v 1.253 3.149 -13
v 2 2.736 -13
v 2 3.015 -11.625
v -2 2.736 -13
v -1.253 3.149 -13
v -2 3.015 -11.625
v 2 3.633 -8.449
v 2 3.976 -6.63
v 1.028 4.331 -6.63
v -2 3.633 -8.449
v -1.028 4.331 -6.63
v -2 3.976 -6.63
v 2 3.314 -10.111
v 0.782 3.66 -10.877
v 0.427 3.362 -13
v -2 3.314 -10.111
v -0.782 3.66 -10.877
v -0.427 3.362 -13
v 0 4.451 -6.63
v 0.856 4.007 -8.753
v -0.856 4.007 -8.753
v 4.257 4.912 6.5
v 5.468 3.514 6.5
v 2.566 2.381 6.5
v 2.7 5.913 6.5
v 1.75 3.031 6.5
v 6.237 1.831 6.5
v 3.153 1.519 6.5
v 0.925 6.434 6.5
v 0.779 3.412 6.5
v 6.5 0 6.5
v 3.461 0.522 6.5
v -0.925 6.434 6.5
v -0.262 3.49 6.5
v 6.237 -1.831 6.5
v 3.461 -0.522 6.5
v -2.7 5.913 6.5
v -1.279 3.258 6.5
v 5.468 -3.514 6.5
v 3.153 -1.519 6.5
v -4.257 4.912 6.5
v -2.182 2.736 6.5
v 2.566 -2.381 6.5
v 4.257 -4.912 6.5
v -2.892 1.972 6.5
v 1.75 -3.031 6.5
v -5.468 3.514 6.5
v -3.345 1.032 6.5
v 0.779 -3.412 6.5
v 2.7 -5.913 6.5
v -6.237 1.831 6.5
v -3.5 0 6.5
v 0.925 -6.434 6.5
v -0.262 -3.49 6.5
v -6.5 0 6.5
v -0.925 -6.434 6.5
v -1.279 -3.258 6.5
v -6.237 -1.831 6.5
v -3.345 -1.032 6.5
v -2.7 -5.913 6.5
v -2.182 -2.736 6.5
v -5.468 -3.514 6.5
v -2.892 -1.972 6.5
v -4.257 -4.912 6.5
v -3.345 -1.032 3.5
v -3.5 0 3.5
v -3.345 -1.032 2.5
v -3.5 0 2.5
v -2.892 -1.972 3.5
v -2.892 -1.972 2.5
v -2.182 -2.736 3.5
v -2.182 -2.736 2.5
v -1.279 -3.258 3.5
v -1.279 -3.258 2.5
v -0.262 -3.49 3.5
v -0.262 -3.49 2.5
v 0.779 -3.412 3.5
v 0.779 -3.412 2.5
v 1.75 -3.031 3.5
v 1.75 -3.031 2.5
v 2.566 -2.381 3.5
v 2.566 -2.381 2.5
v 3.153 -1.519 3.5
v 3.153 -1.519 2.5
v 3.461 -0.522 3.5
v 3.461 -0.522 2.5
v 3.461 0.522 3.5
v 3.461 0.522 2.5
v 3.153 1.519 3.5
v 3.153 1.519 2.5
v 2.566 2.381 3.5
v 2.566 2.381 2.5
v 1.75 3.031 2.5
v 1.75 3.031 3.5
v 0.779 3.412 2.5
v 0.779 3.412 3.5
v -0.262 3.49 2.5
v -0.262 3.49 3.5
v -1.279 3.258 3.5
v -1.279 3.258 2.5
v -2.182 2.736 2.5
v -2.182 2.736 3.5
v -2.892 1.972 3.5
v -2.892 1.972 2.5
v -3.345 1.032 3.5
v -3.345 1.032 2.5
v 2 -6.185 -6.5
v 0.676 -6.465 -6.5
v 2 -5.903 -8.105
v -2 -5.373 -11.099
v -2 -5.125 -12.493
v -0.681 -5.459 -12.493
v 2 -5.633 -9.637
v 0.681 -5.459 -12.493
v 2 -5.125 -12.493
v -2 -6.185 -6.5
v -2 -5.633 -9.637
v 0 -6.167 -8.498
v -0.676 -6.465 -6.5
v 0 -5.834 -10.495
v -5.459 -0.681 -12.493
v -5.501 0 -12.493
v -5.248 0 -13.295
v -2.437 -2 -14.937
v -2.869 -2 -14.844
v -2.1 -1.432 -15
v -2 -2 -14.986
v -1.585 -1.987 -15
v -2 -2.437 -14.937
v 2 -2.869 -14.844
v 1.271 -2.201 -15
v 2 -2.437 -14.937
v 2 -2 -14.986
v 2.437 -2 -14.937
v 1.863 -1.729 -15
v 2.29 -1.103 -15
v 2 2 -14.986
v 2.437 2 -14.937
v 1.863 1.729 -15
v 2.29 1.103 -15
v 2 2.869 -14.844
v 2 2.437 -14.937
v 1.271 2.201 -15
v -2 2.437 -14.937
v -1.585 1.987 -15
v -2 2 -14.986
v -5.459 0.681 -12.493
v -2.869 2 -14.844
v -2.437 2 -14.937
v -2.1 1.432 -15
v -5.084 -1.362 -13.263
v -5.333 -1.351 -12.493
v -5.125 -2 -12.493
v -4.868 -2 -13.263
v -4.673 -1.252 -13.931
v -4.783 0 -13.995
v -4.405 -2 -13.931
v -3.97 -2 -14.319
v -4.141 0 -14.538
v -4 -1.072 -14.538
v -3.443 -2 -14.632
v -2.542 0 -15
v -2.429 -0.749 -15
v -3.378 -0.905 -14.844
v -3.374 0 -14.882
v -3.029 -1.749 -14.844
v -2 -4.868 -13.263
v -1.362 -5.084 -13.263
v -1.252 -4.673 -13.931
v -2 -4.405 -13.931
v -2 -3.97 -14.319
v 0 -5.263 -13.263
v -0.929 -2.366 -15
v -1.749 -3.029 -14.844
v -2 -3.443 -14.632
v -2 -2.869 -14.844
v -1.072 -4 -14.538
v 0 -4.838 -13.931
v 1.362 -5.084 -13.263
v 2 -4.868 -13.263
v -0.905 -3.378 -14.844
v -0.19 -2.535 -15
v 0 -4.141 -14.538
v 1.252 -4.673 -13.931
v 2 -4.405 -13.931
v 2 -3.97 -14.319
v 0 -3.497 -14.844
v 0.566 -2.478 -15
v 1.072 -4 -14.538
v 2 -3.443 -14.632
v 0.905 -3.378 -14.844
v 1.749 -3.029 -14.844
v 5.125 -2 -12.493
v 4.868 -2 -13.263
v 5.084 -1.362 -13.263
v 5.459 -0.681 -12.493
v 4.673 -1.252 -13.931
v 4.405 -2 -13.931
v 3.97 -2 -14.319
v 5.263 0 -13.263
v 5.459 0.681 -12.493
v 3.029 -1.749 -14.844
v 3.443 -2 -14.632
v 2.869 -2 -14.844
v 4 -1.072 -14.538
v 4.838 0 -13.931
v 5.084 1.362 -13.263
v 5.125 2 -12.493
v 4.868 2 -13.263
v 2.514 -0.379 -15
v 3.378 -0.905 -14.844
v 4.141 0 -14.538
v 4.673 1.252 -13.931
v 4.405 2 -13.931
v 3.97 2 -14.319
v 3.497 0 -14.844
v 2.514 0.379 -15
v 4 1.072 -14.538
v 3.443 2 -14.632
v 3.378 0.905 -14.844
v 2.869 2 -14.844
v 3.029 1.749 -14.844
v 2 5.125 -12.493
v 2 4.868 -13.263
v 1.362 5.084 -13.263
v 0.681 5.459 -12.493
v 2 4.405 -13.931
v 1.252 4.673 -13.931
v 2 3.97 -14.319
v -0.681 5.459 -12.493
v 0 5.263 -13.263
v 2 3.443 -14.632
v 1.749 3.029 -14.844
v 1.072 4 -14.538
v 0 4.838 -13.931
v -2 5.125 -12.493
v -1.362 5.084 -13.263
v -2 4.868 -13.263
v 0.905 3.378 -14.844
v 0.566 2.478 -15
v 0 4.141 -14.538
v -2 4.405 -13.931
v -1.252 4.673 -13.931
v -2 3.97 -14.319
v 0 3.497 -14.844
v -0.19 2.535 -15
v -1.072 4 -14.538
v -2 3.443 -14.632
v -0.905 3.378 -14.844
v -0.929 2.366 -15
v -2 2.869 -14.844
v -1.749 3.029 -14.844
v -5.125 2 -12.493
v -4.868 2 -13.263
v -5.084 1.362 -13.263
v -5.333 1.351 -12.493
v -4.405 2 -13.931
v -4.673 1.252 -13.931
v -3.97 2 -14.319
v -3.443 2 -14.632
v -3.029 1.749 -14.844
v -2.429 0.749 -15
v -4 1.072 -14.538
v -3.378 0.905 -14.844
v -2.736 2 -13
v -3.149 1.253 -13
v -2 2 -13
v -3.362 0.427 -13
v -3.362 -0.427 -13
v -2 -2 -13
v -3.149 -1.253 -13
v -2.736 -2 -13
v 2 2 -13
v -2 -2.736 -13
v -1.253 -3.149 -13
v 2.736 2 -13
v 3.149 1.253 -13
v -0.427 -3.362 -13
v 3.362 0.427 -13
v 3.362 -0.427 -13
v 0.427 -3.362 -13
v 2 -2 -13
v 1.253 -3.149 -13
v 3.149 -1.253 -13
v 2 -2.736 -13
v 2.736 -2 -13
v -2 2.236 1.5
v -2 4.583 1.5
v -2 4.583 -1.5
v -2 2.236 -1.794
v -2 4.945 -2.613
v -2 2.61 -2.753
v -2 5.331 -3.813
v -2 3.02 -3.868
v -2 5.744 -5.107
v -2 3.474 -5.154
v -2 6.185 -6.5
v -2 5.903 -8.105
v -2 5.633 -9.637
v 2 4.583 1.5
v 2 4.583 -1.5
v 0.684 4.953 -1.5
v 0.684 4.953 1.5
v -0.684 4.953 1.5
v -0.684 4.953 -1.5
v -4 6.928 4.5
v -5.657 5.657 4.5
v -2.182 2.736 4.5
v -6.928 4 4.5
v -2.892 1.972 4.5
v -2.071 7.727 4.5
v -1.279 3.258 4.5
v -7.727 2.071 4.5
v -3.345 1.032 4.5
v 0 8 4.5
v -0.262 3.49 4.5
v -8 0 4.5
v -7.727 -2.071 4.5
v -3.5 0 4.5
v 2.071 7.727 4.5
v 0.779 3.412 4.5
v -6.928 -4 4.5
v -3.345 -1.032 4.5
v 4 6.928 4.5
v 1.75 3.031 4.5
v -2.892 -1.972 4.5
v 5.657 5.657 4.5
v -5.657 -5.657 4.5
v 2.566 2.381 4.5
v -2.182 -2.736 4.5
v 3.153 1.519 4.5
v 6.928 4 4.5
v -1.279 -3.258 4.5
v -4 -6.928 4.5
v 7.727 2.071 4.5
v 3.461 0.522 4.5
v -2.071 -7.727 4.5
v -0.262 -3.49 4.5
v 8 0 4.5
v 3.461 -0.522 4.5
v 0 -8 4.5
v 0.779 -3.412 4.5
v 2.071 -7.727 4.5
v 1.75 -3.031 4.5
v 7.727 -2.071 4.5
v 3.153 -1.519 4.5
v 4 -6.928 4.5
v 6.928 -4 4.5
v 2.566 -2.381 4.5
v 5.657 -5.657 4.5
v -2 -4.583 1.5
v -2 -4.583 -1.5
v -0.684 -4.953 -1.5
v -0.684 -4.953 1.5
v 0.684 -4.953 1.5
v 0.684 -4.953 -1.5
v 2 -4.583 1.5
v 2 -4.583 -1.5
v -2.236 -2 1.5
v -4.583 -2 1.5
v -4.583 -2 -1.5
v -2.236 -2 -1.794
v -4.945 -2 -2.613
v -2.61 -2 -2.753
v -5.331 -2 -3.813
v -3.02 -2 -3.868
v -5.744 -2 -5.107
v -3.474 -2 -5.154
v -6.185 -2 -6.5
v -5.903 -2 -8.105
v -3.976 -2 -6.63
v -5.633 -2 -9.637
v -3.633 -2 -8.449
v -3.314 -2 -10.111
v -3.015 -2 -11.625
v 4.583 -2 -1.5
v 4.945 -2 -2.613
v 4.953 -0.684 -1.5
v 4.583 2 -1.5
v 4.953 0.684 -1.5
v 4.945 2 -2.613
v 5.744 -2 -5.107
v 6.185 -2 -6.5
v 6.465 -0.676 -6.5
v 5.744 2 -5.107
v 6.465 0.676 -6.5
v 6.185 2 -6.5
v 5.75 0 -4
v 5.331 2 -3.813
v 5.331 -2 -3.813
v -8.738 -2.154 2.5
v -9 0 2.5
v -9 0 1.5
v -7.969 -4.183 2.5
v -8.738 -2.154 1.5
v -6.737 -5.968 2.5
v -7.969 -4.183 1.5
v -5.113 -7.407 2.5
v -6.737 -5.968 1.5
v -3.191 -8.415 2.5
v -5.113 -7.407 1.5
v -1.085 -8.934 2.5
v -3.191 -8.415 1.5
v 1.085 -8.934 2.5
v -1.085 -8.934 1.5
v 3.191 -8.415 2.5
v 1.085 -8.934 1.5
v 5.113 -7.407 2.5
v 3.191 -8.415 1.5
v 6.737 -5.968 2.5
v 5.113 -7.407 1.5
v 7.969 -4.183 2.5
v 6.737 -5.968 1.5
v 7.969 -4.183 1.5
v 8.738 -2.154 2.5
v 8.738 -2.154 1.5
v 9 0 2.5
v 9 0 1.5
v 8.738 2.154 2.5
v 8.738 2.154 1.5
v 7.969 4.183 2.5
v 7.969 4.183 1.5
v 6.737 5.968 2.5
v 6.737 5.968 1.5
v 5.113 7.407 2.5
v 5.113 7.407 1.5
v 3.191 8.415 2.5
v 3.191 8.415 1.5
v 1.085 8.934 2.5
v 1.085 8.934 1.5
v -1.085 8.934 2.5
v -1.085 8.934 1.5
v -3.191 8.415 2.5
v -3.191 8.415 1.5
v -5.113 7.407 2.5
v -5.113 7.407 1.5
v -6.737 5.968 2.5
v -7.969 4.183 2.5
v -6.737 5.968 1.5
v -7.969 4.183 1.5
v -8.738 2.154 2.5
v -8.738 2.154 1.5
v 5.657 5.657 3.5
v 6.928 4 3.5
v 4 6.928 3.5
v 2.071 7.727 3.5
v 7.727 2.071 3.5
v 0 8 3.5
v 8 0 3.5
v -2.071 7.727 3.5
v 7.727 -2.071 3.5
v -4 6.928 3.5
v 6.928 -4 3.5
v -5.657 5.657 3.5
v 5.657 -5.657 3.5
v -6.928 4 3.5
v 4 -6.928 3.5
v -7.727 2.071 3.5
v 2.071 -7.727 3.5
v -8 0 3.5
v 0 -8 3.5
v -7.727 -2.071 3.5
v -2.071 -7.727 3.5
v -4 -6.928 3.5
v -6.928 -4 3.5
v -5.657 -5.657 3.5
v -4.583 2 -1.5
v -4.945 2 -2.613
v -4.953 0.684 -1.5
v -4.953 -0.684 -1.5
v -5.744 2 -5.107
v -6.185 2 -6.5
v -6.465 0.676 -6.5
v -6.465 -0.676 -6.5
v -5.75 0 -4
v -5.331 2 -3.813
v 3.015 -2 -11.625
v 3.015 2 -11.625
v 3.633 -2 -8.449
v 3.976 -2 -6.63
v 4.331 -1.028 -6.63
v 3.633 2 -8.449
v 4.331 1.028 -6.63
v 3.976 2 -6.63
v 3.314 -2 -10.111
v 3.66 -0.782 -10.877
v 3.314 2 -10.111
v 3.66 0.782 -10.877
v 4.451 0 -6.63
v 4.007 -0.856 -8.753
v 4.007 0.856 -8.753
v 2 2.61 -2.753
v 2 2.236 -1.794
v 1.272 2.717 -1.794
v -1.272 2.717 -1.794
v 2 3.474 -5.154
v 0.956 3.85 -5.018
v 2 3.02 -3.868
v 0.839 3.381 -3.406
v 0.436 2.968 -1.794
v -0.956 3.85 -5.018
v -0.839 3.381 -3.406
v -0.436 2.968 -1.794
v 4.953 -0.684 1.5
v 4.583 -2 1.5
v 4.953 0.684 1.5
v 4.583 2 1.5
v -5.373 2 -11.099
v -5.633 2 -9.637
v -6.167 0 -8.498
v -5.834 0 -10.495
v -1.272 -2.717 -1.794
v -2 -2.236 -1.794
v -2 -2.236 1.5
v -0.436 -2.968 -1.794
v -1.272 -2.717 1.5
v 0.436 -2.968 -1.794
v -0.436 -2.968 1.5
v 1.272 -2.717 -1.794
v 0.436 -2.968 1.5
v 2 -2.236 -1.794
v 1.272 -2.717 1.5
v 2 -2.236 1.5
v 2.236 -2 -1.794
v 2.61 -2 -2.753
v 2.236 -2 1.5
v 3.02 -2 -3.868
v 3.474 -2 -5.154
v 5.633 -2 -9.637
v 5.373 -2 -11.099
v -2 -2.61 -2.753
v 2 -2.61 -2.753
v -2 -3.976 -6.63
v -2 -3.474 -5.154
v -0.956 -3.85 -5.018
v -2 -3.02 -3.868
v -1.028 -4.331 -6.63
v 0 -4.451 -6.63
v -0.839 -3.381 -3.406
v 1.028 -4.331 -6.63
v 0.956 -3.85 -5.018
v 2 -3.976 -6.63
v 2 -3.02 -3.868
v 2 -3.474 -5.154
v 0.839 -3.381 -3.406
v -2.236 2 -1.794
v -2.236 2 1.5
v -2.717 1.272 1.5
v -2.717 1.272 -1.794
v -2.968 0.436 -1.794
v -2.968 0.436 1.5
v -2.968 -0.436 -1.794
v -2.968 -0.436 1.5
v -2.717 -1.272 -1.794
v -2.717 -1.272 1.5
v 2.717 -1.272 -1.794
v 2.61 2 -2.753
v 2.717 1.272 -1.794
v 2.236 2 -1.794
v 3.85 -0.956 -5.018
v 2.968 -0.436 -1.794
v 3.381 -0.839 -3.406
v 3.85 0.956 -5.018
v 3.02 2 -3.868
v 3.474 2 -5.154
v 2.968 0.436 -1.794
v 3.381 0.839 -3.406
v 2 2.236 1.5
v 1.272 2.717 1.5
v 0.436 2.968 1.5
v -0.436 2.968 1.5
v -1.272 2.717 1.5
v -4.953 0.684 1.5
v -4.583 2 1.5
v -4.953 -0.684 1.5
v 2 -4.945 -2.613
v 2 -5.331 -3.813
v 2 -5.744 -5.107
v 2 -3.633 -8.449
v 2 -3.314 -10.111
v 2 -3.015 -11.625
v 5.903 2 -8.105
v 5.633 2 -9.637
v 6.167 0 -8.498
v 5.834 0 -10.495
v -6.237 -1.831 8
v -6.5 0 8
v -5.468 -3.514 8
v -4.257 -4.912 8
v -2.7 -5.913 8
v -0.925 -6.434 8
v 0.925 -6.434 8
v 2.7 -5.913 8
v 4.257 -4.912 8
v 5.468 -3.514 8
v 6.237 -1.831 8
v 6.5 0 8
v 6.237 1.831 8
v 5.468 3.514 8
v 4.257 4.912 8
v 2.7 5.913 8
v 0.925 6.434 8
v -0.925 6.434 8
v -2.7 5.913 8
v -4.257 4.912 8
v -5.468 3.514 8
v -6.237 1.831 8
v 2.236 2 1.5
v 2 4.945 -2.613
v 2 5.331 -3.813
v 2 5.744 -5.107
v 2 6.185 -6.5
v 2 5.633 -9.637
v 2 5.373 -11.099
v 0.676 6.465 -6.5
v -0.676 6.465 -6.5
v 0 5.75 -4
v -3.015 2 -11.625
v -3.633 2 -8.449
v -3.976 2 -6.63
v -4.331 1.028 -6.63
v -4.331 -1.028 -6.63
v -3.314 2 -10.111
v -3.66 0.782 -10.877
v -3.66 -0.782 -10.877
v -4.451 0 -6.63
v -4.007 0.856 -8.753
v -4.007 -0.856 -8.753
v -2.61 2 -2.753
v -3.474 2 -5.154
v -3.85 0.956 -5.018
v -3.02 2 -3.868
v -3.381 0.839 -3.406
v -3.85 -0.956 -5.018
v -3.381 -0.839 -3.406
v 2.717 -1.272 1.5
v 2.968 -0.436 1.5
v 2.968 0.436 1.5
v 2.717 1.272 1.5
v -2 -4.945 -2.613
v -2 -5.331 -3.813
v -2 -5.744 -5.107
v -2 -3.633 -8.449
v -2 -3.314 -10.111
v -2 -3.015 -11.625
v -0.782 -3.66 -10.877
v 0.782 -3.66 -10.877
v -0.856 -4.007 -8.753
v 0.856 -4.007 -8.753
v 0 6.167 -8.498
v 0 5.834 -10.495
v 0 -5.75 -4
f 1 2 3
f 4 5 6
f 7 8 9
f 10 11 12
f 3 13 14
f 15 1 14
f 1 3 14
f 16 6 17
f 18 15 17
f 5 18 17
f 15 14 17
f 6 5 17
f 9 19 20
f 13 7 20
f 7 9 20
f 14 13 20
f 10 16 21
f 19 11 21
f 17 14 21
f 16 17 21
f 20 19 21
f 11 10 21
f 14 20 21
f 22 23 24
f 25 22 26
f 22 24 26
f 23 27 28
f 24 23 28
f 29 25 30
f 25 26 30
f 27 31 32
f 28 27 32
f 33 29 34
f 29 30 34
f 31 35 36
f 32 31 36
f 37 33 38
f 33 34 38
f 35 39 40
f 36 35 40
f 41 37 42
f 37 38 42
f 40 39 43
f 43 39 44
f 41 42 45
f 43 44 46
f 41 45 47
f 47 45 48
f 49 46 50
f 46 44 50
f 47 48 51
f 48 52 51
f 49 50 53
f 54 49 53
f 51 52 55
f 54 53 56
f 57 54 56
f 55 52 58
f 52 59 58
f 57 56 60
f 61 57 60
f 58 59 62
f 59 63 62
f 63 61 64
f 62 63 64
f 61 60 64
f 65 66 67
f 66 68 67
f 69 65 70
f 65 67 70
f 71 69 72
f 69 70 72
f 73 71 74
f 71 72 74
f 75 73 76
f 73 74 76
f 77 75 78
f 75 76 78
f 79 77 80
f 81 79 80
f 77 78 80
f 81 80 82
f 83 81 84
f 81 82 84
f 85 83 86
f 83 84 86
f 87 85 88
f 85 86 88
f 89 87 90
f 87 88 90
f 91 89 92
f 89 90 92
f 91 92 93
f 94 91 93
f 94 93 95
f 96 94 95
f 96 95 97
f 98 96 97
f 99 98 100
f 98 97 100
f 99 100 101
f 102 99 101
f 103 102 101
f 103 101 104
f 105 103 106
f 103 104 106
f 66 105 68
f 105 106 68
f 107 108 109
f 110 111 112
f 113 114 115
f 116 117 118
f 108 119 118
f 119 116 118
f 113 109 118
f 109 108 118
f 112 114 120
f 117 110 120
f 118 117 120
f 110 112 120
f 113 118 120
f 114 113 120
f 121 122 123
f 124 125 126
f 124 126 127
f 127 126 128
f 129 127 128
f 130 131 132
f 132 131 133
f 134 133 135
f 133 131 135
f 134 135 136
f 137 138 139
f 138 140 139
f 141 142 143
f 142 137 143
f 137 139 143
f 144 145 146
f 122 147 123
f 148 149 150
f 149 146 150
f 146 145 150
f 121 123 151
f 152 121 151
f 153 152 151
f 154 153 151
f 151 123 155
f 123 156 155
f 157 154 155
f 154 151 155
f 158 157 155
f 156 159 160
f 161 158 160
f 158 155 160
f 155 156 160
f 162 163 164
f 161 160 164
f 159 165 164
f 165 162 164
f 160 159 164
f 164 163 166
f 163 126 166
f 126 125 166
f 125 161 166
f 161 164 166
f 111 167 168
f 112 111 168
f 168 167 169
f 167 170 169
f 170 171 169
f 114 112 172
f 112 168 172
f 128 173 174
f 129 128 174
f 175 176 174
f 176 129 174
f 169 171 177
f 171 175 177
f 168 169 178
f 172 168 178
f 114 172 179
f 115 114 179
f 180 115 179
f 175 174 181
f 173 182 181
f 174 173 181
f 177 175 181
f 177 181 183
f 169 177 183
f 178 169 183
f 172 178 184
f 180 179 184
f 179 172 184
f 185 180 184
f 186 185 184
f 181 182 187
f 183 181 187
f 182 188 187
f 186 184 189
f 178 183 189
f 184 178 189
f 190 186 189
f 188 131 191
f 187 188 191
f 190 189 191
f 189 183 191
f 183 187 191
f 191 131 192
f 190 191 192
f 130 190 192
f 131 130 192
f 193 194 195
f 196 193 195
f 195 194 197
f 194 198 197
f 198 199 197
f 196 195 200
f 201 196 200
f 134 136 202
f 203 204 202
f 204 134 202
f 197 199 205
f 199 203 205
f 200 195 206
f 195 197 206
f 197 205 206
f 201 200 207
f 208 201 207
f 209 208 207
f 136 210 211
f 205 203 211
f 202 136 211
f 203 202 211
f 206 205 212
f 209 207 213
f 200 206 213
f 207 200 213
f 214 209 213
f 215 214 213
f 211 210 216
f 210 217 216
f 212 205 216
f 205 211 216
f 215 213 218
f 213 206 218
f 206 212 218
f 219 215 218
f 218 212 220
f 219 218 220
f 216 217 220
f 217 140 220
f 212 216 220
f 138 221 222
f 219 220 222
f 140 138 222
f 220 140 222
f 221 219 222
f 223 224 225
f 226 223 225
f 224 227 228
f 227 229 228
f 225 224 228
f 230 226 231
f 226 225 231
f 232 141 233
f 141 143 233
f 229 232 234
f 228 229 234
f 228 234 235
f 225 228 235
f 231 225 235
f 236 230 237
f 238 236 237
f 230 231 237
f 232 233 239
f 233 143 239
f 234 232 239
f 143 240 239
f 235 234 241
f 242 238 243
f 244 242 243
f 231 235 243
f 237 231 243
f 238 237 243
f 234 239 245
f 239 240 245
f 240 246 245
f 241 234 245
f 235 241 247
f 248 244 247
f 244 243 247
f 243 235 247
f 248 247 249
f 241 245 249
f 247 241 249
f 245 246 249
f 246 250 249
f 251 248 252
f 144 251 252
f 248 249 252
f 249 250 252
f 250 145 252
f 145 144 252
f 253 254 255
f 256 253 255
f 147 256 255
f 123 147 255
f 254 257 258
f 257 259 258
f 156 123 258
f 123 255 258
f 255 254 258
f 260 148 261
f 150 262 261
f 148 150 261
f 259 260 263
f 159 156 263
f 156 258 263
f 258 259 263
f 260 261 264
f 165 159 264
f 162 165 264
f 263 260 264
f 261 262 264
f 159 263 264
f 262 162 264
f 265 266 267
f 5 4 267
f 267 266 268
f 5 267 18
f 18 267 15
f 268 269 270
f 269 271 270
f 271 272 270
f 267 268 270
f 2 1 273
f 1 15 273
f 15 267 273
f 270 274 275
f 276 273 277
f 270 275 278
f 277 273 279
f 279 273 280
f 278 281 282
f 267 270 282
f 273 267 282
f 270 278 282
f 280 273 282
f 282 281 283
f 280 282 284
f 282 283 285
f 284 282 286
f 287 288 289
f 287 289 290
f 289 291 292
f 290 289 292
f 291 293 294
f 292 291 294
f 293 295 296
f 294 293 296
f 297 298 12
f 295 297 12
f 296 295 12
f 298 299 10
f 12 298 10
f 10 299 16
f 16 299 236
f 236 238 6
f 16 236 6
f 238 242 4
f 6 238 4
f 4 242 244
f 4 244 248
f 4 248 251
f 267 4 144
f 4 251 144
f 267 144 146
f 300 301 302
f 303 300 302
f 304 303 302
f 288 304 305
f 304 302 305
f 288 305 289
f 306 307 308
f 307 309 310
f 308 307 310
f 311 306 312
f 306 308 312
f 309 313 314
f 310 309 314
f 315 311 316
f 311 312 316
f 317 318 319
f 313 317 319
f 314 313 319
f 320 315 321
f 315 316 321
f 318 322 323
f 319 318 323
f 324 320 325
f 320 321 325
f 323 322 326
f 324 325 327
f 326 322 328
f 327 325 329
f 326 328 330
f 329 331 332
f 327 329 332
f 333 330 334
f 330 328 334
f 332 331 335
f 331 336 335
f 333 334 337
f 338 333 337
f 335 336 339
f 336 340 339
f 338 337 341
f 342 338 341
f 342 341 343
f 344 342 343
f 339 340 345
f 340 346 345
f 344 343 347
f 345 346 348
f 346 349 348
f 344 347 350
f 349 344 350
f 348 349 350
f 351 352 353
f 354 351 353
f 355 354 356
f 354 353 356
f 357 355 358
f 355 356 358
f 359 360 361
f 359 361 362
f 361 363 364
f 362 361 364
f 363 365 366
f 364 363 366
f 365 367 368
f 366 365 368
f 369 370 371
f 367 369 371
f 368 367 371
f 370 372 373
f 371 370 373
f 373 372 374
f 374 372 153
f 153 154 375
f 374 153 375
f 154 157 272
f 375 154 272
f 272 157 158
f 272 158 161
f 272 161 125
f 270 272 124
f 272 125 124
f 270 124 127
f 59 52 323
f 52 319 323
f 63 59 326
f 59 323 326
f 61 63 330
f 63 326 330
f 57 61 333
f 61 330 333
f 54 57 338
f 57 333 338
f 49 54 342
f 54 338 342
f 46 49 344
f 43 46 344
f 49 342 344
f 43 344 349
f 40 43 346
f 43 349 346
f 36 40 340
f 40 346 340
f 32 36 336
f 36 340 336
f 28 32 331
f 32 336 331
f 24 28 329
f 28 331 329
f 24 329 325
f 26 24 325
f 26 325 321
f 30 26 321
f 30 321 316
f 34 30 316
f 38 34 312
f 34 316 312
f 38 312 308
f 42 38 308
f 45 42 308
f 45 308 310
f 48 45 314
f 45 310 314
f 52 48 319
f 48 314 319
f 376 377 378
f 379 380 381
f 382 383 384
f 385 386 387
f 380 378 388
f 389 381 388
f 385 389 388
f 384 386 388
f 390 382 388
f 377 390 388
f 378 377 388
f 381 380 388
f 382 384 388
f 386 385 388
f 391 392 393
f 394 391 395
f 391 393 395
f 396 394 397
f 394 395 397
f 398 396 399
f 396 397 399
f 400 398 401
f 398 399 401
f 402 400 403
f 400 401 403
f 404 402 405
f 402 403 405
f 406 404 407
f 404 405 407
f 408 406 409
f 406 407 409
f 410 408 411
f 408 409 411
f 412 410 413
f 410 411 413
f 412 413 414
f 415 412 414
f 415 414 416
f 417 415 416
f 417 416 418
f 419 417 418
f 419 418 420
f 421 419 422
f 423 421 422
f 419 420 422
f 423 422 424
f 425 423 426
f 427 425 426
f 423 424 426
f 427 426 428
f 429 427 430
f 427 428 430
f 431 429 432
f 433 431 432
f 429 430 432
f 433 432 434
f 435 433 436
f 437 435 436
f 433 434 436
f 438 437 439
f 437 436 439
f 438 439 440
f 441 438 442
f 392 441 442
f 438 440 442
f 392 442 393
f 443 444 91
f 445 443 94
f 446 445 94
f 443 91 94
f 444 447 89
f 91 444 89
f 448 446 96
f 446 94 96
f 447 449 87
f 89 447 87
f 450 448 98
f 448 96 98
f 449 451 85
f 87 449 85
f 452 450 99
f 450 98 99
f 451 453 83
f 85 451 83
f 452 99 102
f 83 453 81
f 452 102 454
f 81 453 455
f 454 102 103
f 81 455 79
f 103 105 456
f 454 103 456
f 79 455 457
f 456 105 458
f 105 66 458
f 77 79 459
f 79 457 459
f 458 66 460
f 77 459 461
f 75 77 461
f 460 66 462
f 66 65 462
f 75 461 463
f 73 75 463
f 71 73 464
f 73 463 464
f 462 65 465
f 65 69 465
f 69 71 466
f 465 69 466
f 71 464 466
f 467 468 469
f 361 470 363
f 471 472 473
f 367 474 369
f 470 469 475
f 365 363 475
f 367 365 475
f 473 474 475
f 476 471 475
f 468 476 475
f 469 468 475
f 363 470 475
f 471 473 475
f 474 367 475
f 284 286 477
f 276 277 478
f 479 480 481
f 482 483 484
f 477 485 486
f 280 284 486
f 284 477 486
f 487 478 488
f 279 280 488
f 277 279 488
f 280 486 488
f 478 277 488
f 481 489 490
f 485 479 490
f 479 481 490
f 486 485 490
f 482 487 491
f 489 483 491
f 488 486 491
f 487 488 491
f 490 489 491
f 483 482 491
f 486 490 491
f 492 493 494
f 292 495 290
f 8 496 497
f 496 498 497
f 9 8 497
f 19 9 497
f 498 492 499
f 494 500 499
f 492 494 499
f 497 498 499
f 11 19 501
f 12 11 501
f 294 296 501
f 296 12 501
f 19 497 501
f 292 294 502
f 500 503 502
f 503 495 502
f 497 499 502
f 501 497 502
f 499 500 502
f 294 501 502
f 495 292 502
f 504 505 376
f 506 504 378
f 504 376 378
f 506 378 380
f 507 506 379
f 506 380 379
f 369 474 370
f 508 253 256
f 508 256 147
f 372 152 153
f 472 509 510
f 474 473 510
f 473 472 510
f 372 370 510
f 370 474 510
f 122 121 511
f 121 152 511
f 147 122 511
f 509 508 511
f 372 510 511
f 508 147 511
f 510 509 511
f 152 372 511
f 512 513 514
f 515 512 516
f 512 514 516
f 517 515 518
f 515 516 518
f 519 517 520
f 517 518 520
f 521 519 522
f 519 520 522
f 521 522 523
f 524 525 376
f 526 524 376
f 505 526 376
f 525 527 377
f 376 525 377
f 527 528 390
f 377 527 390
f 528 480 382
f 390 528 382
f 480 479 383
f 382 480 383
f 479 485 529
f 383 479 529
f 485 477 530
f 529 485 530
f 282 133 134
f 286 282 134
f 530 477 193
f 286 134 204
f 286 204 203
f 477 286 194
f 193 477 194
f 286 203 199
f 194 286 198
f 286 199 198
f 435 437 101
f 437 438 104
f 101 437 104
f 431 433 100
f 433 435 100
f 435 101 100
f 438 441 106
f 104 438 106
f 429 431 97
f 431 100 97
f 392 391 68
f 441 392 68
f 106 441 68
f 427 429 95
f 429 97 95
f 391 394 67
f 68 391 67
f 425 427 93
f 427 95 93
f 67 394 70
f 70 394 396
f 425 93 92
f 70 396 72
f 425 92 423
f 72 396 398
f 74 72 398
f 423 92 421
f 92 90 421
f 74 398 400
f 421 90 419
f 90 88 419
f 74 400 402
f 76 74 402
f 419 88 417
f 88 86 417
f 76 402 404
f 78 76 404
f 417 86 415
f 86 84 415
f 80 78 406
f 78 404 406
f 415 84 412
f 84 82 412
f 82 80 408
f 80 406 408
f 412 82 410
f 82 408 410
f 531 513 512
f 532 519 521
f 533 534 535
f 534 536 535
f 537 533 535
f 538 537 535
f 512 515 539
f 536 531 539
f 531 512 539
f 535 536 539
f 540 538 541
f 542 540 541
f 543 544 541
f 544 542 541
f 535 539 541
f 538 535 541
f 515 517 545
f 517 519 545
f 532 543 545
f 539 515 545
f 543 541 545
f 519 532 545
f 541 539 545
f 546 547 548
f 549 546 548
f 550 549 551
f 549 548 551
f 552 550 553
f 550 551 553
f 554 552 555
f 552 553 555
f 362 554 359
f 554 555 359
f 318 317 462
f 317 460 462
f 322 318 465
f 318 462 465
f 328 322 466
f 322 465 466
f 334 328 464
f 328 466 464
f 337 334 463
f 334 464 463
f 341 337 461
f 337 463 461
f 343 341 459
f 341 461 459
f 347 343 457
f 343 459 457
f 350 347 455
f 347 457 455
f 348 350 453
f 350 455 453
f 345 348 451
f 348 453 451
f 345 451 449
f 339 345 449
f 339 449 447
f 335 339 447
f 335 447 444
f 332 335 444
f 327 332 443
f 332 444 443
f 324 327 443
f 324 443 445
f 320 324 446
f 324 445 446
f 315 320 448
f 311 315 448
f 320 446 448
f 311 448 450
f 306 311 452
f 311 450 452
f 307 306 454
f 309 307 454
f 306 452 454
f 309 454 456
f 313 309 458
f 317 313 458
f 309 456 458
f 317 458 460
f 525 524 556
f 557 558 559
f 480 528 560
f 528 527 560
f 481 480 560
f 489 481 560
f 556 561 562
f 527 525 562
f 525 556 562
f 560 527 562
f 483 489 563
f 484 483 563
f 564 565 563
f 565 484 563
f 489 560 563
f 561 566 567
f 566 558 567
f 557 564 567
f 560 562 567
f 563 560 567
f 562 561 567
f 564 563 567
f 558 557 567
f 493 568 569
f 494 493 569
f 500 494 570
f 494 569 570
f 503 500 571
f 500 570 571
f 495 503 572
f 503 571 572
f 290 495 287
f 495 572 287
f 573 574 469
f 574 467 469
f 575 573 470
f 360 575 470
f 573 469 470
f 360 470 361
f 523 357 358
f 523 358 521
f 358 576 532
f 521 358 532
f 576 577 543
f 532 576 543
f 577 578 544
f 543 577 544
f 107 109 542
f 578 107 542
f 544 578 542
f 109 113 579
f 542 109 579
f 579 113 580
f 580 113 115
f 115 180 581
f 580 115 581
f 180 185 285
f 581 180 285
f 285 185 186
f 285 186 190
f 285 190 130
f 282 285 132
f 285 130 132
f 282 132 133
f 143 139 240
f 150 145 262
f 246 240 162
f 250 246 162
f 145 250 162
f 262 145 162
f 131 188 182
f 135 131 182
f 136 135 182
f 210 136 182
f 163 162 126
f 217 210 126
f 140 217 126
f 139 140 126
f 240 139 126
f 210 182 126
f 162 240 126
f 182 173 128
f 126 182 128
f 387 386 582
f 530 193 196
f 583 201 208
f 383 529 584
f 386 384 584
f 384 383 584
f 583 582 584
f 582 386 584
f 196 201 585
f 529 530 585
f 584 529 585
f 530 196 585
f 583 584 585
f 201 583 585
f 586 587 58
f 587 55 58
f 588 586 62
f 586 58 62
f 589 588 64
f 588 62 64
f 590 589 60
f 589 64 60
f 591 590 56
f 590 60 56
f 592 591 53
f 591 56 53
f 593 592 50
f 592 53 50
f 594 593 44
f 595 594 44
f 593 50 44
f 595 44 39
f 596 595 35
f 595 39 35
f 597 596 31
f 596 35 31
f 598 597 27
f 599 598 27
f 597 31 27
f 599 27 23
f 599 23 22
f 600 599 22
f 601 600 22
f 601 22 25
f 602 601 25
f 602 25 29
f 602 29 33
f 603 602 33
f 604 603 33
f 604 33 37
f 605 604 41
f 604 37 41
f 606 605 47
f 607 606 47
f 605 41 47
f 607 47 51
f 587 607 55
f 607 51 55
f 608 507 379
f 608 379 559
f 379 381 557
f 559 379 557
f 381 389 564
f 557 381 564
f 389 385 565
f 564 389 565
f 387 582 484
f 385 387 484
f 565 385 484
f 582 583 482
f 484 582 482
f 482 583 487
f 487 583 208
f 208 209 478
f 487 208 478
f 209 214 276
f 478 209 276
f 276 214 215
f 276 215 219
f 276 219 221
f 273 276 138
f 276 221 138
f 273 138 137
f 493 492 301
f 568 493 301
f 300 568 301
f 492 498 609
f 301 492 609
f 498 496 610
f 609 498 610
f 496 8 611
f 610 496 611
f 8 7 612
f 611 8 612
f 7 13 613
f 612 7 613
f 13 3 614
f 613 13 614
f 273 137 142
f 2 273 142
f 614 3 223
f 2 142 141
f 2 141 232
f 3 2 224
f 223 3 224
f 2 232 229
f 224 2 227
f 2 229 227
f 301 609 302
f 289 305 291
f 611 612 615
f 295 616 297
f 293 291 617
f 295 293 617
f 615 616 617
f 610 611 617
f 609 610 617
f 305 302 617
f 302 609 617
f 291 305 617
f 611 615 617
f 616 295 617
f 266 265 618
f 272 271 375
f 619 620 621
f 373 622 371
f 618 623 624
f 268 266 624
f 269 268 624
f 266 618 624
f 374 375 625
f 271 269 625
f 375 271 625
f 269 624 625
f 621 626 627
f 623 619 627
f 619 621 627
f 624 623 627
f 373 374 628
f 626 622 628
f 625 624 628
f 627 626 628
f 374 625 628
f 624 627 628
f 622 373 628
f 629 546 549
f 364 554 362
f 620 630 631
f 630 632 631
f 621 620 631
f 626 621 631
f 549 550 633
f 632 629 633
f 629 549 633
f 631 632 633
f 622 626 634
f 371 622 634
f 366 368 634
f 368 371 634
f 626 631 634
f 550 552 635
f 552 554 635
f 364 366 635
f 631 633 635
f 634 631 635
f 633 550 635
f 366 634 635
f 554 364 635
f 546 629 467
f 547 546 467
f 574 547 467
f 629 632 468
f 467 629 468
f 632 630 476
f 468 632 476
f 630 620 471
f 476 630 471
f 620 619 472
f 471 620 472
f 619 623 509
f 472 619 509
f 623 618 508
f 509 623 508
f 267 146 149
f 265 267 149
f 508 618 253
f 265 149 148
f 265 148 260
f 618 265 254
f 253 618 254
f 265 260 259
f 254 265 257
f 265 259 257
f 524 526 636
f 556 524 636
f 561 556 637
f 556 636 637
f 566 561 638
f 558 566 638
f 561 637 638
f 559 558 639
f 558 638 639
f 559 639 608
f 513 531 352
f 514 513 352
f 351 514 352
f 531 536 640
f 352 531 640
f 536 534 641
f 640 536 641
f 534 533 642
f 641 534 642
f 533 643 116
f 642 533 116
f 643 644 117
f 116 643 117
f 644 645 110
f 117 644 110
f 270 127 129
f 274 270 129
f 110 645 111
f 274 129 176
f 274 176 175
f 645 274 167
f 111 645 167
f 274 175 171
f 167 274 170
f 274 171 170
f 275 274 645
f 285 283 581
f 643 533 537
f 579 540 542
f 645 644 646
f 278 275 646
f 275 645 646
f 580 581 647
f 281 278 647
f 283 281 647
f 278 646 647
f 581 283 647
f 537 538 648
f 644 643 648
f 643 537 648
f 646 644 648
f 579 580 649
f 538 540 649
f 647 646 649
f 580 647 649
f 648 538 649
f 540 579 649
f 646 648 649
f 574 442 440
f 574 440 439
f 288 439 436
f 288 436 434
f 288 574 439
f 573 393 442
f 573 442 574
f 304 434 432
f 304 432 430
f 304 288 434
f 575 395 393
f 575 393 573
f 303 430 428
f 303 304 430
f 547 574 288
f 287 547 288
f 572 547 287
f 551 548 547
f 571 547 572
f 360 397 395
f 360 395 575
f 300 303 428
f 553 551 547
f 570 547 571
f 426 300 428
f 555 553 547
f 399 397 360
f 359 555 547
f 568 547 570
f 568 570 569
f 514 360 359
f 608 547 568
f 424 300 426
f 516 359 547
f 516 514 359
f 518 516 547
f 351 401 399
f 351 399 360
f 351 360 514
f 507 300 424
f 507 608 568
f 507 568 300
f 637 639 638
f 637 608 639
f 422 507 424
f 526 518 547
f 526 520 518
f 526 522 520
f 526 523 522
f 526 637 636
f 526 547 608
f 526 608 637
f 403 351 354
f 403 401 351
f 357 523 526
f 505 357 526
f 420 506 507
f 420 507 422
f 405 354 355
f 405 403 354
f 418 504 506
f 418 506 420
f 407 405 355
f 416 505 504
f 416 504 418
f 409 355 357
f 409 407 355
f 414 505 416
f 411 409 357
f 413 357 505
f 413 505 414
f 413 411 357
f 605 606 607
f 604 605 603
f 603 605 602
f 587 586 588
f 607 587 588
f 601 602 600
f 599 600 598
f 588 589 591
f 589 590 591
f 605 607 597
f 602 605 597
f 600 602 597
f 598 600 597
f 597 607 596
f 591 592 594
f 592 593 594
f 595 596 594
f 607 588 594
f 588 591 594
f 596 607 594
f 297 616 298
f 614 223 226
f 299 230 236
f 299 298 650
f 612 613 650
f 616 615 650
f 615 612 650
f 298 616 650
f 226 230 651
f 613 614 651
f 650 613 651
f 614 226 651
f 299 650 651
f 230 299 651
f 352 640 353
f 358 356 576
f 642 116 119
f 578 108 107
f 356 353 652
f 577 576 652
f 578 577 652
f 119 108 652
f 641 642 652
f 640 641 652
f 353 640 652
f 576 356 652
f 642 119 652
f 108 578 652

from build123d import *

# Parameters (mm, degrees)
FILLET_2_R               = 3
CUT_EXTRUDE_2_REACH      = 28.287
SKETCH_4_W               = 12.083655217
SKETCH_4_H               = 11.542596028
PATTERN_CIRCULAR_2_COUNT = 4


with BuildPart() as part:
    # ｽｹｯﾁ3 → 回転2 (revolve)
    with BuildSketch(Plane(origin=(0, 0, 0), x_dir=(0, 0, -1), z_dir=(1, 0, 0)), mode=Mode.PRIVATE) as revolve_2_sk:
        Polygon((-1.5, 5), (1.5, 5), (6.5, 6.5), (15, 5.083333333), (15, 0), (13, 0), (13, 3.389079157), (6.629586696, 4.450814707), (1.793537673, 3), (-1.5, 3), (-1.5, 0), (-8, 0), (-8, 6.5), (-6.5, 6.5), (-6.5, 3.5), (-4.5, 3.5), (-4.5, 8), (-3.5, 8), (-3.5, 3.5), (-2.5, 3.5), (-2.5, 9), (-1.5, 9), align=None)
    revolve(revolve_2_sk.sketch.rotate(Axis((0, 0, 0), (0, 0, 1)), 90), axis=Axis((0, 0, 0), (0, 0, 1)))

    # ﾌｨﾚｯﾄ2
    fillet_2_edges = [part.edges().sort_by_distance(p)[0] for p in [
        (5.083333333, 0, -15),
    ]]
    fillet(fillet_2_edges, radius=FILLET_2_R)

    # ｶｯﾄ - 押し出し2: up to this face of the body (flat: up to its plane)
    cut_extrude_2_end = Plane(part.part.faces().sort_by_distance((8.745441559, 0, 1.5))[0])
    # ｽｹｯﾁ4 → ｶｯﾄ - 押し出し2 (cut, up to the picked face)
    with BuildSketch(Plane(origin=(0, 0, -15), x_dir=(-1, 0, 0), z_dir=(0, 0, -1)), mode=Mode.PRIVATE) as cut_extrude_2_sk1:
        with Locations((-8.041827609, 7.771298014)):
            Rectangle(SKETCH_4_W, SKETCH_4_H)
    cut_extrude_2_tool1 = split(extrude(cut_extrude_2_sk1.sketch, amount=-CUT_EXTRUDE_2_REACH, mode=Mode.PRIVATE), bisect_by=cut_extrude_2_end, keep=Keep.BOTH, mode=Mode.PRIVATE)
    cut_extrude_2 = cut_extrude_2_tool1.solids().sort_by(Axis((8.041828, 7.771298, -15), (0, 0, 1)))[0]
    add(cut_extrude_2, mode=Mode.SUBTRACT)

    # 円形ﾊﾟﾀｰﾝ2: ｶｯﾄ - 押し出し2 ×4 about axis
    pattern_circular_2_axis = Axis((0, 0, 0), (0, 0, 1))
    for i in range(1, PATTERN_CIRCULAR_2_COUNT):
        add(cut_extrude_2.rotate(pattern_circular_2_axis, i * 360 / PATTERN_CIRCULAR_2_COUNT), mode=Mode.SUBTRACT)


solid = part.part
